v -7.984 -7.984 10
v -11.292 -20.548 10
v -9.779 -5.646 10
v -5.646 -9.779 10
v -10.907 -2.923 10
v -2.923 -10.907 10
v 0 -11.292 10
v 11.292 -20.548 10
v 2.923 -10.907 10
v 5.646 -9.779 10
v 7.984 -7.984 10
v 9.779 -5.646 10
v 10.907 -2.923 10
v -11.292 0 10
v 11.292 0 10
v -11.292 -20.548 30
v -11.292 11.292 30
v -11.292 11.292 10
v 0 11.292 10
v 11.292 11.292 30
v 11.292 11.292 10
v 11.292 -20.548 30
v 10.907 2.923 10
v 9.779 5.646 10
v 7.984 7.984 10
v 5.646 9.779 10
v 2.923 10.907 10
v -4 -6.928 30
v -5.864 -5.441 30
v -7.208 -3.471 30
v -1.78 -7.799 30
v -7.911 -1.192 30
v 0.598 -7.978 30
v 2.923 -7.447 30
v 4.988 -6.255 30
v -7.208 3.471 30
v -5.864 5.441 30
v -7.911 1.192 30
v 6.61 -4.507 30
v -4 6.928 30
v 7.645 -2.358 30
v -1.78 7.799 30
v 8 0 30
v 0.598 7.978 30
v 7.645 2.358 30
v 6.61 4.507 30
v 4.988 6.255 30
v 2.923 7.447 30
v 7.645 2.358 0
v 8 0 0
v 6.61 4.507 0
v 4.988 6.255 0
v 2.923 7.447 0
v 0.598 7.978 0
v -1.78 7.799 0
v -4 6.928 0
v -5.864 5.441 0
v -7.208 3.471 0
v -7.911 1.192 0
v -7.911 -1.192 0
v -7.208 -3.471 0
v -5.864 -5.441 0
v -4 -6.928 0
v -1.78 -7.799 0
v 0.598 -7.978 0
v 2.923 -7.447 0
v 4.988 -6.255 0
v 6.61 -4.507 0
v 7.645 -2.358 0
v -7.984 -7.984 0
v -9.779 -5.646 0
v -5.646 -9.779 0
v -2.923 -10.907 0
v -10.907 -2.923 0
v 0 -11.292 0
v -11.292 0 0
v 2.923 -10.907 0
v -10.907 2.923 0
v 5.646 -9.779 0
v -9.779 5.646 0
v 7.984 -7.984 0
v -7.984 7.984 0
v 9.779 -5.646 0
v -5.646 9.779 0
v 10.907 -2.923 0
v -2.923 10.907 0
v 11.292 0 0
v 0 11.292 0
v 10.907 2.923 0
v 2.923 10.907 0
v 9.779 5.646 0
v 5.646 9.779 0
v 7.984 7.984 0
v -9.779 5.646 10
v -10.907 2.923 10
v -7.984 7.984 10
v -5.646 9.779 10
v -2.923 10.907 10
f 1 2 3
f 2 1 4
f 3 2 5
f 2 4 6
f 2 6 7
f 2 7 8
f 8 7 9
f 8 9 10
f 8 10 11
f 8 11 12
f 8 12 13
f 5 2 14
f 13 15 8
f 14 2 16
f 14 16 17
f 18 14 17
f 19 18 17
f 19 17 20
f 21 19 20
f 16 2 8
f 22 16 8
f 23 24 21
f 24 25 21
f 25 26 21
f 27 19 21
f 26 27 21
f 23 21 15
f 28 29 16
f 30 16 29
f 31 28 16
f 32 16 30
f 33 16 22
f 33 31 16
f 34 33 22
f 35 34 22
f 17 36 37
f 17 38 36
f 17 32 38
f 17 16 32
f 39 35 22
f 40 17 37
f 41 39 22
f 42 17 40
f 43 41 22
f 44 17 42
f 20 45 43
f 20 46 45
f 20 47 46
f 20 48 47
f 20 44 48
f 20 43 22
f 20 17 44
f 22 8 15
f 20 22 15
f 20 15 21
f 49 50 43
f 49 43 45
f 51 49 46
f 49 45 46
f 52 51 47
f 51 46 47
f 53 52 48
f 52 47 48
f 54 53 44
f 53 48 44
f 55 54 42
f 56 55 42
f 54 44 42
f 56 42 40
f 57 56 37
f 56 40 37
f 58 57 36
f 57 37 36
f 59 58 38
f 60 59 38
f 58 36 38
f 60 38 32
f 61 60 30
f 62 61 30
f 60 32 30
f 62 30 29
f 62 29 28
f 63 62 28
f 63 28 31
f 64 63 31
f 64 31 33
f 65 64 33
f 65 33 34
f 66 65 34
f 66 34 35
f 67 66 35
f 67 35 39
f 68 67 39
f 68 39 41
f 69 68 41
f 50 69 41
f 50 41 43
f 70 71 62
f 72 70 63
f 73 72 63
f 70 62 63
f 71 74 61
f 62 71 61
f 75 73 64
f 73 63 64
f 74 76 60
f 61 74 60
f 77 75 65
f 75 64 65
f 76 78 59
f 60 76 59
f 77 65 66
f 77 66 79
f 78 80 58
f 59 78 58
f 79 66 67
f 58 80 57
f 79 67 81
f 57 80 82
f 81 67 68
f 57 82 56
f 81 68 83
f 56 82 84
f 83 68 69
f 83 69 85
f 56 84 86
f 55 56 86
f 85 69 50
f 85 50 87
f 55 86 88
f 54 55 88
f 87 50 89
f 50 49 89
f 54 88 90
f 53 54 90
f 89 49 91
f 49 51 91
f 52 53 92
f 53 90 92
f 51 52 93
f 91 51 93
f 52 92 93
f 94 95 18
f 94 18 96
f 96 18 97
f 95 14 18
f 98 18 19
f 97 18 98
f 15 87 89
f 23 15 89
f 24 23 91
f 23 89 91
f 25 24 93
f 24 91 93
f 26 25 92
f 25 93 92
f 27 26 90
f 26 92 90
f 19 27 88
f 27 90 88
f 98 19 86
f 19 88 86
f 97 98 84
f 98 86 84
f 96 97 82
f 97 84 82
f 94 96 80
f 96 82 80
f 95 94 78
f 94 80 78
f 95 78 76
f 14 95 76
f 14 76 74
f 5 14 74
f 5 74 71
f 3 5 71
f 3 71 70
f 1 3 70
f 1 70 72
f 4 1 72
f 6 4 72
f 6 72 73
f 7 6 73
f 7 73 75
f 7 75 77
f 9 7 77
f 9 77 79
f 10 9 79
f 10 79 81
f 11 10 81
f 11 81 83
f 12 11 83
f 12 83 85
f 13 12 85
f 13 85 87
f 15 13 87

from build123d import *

# Parameters (mm, degrees)
SKETCH1_R           = 11.291730028
SKETCH1_R_2         = 8
BOSS_EXTRUDE1_DEPTH = 10
SKETCH2_W           = 22.583460056
SKETCH2_H           = 31.840111269
BOSS_EXTRUDE2_DEPTH = 20
CUT_EXTRUDE1_REACH  = 40.075
SKETCH3_R           = 8


with BuildPart() as part:
    # Sketch1 → Boss-Extrude1 (new body)
    with BuildSketch(Plane.XY):
        Circle(SKETCH1_R)
        Circle(SKETCH1_R_2, mode=Mode.SUBTRACT)
    extrude(amount=BOSS_EXTRUDE1_DEPTH)

    # Sketch2 → Boss-Extrude2 (add)
    with BuildSketch(Plane.XY.offset(10)):
        with Locations((0, -4.628325607)):
            Rectangle(SKETCH2_W, SKETCH2_H)
    extrude(amount=BOSS_EXTRUDE2_DEPTH)

    # Sketch3 → Cut-Extrude1 (cut, up to next)
    with BuildSketch(Plane.XY.offset(30), mode=Mode.PRIVATE) as cut_extrude1_sk1:
        Circle(SKETCH3_R)
    cut_extrude1_tool1 = extrude(cut_extrude1_sk1.sketch, amount=-CUT_EXTRUDE1_REACH, mode=Mode.PRIVATE) & part.part
    add(cut_extrude1_tool1.solids().sort_by_distance((0, 0, 30))[0], mode=Mode.SUBTRACT)


solid = part.part
